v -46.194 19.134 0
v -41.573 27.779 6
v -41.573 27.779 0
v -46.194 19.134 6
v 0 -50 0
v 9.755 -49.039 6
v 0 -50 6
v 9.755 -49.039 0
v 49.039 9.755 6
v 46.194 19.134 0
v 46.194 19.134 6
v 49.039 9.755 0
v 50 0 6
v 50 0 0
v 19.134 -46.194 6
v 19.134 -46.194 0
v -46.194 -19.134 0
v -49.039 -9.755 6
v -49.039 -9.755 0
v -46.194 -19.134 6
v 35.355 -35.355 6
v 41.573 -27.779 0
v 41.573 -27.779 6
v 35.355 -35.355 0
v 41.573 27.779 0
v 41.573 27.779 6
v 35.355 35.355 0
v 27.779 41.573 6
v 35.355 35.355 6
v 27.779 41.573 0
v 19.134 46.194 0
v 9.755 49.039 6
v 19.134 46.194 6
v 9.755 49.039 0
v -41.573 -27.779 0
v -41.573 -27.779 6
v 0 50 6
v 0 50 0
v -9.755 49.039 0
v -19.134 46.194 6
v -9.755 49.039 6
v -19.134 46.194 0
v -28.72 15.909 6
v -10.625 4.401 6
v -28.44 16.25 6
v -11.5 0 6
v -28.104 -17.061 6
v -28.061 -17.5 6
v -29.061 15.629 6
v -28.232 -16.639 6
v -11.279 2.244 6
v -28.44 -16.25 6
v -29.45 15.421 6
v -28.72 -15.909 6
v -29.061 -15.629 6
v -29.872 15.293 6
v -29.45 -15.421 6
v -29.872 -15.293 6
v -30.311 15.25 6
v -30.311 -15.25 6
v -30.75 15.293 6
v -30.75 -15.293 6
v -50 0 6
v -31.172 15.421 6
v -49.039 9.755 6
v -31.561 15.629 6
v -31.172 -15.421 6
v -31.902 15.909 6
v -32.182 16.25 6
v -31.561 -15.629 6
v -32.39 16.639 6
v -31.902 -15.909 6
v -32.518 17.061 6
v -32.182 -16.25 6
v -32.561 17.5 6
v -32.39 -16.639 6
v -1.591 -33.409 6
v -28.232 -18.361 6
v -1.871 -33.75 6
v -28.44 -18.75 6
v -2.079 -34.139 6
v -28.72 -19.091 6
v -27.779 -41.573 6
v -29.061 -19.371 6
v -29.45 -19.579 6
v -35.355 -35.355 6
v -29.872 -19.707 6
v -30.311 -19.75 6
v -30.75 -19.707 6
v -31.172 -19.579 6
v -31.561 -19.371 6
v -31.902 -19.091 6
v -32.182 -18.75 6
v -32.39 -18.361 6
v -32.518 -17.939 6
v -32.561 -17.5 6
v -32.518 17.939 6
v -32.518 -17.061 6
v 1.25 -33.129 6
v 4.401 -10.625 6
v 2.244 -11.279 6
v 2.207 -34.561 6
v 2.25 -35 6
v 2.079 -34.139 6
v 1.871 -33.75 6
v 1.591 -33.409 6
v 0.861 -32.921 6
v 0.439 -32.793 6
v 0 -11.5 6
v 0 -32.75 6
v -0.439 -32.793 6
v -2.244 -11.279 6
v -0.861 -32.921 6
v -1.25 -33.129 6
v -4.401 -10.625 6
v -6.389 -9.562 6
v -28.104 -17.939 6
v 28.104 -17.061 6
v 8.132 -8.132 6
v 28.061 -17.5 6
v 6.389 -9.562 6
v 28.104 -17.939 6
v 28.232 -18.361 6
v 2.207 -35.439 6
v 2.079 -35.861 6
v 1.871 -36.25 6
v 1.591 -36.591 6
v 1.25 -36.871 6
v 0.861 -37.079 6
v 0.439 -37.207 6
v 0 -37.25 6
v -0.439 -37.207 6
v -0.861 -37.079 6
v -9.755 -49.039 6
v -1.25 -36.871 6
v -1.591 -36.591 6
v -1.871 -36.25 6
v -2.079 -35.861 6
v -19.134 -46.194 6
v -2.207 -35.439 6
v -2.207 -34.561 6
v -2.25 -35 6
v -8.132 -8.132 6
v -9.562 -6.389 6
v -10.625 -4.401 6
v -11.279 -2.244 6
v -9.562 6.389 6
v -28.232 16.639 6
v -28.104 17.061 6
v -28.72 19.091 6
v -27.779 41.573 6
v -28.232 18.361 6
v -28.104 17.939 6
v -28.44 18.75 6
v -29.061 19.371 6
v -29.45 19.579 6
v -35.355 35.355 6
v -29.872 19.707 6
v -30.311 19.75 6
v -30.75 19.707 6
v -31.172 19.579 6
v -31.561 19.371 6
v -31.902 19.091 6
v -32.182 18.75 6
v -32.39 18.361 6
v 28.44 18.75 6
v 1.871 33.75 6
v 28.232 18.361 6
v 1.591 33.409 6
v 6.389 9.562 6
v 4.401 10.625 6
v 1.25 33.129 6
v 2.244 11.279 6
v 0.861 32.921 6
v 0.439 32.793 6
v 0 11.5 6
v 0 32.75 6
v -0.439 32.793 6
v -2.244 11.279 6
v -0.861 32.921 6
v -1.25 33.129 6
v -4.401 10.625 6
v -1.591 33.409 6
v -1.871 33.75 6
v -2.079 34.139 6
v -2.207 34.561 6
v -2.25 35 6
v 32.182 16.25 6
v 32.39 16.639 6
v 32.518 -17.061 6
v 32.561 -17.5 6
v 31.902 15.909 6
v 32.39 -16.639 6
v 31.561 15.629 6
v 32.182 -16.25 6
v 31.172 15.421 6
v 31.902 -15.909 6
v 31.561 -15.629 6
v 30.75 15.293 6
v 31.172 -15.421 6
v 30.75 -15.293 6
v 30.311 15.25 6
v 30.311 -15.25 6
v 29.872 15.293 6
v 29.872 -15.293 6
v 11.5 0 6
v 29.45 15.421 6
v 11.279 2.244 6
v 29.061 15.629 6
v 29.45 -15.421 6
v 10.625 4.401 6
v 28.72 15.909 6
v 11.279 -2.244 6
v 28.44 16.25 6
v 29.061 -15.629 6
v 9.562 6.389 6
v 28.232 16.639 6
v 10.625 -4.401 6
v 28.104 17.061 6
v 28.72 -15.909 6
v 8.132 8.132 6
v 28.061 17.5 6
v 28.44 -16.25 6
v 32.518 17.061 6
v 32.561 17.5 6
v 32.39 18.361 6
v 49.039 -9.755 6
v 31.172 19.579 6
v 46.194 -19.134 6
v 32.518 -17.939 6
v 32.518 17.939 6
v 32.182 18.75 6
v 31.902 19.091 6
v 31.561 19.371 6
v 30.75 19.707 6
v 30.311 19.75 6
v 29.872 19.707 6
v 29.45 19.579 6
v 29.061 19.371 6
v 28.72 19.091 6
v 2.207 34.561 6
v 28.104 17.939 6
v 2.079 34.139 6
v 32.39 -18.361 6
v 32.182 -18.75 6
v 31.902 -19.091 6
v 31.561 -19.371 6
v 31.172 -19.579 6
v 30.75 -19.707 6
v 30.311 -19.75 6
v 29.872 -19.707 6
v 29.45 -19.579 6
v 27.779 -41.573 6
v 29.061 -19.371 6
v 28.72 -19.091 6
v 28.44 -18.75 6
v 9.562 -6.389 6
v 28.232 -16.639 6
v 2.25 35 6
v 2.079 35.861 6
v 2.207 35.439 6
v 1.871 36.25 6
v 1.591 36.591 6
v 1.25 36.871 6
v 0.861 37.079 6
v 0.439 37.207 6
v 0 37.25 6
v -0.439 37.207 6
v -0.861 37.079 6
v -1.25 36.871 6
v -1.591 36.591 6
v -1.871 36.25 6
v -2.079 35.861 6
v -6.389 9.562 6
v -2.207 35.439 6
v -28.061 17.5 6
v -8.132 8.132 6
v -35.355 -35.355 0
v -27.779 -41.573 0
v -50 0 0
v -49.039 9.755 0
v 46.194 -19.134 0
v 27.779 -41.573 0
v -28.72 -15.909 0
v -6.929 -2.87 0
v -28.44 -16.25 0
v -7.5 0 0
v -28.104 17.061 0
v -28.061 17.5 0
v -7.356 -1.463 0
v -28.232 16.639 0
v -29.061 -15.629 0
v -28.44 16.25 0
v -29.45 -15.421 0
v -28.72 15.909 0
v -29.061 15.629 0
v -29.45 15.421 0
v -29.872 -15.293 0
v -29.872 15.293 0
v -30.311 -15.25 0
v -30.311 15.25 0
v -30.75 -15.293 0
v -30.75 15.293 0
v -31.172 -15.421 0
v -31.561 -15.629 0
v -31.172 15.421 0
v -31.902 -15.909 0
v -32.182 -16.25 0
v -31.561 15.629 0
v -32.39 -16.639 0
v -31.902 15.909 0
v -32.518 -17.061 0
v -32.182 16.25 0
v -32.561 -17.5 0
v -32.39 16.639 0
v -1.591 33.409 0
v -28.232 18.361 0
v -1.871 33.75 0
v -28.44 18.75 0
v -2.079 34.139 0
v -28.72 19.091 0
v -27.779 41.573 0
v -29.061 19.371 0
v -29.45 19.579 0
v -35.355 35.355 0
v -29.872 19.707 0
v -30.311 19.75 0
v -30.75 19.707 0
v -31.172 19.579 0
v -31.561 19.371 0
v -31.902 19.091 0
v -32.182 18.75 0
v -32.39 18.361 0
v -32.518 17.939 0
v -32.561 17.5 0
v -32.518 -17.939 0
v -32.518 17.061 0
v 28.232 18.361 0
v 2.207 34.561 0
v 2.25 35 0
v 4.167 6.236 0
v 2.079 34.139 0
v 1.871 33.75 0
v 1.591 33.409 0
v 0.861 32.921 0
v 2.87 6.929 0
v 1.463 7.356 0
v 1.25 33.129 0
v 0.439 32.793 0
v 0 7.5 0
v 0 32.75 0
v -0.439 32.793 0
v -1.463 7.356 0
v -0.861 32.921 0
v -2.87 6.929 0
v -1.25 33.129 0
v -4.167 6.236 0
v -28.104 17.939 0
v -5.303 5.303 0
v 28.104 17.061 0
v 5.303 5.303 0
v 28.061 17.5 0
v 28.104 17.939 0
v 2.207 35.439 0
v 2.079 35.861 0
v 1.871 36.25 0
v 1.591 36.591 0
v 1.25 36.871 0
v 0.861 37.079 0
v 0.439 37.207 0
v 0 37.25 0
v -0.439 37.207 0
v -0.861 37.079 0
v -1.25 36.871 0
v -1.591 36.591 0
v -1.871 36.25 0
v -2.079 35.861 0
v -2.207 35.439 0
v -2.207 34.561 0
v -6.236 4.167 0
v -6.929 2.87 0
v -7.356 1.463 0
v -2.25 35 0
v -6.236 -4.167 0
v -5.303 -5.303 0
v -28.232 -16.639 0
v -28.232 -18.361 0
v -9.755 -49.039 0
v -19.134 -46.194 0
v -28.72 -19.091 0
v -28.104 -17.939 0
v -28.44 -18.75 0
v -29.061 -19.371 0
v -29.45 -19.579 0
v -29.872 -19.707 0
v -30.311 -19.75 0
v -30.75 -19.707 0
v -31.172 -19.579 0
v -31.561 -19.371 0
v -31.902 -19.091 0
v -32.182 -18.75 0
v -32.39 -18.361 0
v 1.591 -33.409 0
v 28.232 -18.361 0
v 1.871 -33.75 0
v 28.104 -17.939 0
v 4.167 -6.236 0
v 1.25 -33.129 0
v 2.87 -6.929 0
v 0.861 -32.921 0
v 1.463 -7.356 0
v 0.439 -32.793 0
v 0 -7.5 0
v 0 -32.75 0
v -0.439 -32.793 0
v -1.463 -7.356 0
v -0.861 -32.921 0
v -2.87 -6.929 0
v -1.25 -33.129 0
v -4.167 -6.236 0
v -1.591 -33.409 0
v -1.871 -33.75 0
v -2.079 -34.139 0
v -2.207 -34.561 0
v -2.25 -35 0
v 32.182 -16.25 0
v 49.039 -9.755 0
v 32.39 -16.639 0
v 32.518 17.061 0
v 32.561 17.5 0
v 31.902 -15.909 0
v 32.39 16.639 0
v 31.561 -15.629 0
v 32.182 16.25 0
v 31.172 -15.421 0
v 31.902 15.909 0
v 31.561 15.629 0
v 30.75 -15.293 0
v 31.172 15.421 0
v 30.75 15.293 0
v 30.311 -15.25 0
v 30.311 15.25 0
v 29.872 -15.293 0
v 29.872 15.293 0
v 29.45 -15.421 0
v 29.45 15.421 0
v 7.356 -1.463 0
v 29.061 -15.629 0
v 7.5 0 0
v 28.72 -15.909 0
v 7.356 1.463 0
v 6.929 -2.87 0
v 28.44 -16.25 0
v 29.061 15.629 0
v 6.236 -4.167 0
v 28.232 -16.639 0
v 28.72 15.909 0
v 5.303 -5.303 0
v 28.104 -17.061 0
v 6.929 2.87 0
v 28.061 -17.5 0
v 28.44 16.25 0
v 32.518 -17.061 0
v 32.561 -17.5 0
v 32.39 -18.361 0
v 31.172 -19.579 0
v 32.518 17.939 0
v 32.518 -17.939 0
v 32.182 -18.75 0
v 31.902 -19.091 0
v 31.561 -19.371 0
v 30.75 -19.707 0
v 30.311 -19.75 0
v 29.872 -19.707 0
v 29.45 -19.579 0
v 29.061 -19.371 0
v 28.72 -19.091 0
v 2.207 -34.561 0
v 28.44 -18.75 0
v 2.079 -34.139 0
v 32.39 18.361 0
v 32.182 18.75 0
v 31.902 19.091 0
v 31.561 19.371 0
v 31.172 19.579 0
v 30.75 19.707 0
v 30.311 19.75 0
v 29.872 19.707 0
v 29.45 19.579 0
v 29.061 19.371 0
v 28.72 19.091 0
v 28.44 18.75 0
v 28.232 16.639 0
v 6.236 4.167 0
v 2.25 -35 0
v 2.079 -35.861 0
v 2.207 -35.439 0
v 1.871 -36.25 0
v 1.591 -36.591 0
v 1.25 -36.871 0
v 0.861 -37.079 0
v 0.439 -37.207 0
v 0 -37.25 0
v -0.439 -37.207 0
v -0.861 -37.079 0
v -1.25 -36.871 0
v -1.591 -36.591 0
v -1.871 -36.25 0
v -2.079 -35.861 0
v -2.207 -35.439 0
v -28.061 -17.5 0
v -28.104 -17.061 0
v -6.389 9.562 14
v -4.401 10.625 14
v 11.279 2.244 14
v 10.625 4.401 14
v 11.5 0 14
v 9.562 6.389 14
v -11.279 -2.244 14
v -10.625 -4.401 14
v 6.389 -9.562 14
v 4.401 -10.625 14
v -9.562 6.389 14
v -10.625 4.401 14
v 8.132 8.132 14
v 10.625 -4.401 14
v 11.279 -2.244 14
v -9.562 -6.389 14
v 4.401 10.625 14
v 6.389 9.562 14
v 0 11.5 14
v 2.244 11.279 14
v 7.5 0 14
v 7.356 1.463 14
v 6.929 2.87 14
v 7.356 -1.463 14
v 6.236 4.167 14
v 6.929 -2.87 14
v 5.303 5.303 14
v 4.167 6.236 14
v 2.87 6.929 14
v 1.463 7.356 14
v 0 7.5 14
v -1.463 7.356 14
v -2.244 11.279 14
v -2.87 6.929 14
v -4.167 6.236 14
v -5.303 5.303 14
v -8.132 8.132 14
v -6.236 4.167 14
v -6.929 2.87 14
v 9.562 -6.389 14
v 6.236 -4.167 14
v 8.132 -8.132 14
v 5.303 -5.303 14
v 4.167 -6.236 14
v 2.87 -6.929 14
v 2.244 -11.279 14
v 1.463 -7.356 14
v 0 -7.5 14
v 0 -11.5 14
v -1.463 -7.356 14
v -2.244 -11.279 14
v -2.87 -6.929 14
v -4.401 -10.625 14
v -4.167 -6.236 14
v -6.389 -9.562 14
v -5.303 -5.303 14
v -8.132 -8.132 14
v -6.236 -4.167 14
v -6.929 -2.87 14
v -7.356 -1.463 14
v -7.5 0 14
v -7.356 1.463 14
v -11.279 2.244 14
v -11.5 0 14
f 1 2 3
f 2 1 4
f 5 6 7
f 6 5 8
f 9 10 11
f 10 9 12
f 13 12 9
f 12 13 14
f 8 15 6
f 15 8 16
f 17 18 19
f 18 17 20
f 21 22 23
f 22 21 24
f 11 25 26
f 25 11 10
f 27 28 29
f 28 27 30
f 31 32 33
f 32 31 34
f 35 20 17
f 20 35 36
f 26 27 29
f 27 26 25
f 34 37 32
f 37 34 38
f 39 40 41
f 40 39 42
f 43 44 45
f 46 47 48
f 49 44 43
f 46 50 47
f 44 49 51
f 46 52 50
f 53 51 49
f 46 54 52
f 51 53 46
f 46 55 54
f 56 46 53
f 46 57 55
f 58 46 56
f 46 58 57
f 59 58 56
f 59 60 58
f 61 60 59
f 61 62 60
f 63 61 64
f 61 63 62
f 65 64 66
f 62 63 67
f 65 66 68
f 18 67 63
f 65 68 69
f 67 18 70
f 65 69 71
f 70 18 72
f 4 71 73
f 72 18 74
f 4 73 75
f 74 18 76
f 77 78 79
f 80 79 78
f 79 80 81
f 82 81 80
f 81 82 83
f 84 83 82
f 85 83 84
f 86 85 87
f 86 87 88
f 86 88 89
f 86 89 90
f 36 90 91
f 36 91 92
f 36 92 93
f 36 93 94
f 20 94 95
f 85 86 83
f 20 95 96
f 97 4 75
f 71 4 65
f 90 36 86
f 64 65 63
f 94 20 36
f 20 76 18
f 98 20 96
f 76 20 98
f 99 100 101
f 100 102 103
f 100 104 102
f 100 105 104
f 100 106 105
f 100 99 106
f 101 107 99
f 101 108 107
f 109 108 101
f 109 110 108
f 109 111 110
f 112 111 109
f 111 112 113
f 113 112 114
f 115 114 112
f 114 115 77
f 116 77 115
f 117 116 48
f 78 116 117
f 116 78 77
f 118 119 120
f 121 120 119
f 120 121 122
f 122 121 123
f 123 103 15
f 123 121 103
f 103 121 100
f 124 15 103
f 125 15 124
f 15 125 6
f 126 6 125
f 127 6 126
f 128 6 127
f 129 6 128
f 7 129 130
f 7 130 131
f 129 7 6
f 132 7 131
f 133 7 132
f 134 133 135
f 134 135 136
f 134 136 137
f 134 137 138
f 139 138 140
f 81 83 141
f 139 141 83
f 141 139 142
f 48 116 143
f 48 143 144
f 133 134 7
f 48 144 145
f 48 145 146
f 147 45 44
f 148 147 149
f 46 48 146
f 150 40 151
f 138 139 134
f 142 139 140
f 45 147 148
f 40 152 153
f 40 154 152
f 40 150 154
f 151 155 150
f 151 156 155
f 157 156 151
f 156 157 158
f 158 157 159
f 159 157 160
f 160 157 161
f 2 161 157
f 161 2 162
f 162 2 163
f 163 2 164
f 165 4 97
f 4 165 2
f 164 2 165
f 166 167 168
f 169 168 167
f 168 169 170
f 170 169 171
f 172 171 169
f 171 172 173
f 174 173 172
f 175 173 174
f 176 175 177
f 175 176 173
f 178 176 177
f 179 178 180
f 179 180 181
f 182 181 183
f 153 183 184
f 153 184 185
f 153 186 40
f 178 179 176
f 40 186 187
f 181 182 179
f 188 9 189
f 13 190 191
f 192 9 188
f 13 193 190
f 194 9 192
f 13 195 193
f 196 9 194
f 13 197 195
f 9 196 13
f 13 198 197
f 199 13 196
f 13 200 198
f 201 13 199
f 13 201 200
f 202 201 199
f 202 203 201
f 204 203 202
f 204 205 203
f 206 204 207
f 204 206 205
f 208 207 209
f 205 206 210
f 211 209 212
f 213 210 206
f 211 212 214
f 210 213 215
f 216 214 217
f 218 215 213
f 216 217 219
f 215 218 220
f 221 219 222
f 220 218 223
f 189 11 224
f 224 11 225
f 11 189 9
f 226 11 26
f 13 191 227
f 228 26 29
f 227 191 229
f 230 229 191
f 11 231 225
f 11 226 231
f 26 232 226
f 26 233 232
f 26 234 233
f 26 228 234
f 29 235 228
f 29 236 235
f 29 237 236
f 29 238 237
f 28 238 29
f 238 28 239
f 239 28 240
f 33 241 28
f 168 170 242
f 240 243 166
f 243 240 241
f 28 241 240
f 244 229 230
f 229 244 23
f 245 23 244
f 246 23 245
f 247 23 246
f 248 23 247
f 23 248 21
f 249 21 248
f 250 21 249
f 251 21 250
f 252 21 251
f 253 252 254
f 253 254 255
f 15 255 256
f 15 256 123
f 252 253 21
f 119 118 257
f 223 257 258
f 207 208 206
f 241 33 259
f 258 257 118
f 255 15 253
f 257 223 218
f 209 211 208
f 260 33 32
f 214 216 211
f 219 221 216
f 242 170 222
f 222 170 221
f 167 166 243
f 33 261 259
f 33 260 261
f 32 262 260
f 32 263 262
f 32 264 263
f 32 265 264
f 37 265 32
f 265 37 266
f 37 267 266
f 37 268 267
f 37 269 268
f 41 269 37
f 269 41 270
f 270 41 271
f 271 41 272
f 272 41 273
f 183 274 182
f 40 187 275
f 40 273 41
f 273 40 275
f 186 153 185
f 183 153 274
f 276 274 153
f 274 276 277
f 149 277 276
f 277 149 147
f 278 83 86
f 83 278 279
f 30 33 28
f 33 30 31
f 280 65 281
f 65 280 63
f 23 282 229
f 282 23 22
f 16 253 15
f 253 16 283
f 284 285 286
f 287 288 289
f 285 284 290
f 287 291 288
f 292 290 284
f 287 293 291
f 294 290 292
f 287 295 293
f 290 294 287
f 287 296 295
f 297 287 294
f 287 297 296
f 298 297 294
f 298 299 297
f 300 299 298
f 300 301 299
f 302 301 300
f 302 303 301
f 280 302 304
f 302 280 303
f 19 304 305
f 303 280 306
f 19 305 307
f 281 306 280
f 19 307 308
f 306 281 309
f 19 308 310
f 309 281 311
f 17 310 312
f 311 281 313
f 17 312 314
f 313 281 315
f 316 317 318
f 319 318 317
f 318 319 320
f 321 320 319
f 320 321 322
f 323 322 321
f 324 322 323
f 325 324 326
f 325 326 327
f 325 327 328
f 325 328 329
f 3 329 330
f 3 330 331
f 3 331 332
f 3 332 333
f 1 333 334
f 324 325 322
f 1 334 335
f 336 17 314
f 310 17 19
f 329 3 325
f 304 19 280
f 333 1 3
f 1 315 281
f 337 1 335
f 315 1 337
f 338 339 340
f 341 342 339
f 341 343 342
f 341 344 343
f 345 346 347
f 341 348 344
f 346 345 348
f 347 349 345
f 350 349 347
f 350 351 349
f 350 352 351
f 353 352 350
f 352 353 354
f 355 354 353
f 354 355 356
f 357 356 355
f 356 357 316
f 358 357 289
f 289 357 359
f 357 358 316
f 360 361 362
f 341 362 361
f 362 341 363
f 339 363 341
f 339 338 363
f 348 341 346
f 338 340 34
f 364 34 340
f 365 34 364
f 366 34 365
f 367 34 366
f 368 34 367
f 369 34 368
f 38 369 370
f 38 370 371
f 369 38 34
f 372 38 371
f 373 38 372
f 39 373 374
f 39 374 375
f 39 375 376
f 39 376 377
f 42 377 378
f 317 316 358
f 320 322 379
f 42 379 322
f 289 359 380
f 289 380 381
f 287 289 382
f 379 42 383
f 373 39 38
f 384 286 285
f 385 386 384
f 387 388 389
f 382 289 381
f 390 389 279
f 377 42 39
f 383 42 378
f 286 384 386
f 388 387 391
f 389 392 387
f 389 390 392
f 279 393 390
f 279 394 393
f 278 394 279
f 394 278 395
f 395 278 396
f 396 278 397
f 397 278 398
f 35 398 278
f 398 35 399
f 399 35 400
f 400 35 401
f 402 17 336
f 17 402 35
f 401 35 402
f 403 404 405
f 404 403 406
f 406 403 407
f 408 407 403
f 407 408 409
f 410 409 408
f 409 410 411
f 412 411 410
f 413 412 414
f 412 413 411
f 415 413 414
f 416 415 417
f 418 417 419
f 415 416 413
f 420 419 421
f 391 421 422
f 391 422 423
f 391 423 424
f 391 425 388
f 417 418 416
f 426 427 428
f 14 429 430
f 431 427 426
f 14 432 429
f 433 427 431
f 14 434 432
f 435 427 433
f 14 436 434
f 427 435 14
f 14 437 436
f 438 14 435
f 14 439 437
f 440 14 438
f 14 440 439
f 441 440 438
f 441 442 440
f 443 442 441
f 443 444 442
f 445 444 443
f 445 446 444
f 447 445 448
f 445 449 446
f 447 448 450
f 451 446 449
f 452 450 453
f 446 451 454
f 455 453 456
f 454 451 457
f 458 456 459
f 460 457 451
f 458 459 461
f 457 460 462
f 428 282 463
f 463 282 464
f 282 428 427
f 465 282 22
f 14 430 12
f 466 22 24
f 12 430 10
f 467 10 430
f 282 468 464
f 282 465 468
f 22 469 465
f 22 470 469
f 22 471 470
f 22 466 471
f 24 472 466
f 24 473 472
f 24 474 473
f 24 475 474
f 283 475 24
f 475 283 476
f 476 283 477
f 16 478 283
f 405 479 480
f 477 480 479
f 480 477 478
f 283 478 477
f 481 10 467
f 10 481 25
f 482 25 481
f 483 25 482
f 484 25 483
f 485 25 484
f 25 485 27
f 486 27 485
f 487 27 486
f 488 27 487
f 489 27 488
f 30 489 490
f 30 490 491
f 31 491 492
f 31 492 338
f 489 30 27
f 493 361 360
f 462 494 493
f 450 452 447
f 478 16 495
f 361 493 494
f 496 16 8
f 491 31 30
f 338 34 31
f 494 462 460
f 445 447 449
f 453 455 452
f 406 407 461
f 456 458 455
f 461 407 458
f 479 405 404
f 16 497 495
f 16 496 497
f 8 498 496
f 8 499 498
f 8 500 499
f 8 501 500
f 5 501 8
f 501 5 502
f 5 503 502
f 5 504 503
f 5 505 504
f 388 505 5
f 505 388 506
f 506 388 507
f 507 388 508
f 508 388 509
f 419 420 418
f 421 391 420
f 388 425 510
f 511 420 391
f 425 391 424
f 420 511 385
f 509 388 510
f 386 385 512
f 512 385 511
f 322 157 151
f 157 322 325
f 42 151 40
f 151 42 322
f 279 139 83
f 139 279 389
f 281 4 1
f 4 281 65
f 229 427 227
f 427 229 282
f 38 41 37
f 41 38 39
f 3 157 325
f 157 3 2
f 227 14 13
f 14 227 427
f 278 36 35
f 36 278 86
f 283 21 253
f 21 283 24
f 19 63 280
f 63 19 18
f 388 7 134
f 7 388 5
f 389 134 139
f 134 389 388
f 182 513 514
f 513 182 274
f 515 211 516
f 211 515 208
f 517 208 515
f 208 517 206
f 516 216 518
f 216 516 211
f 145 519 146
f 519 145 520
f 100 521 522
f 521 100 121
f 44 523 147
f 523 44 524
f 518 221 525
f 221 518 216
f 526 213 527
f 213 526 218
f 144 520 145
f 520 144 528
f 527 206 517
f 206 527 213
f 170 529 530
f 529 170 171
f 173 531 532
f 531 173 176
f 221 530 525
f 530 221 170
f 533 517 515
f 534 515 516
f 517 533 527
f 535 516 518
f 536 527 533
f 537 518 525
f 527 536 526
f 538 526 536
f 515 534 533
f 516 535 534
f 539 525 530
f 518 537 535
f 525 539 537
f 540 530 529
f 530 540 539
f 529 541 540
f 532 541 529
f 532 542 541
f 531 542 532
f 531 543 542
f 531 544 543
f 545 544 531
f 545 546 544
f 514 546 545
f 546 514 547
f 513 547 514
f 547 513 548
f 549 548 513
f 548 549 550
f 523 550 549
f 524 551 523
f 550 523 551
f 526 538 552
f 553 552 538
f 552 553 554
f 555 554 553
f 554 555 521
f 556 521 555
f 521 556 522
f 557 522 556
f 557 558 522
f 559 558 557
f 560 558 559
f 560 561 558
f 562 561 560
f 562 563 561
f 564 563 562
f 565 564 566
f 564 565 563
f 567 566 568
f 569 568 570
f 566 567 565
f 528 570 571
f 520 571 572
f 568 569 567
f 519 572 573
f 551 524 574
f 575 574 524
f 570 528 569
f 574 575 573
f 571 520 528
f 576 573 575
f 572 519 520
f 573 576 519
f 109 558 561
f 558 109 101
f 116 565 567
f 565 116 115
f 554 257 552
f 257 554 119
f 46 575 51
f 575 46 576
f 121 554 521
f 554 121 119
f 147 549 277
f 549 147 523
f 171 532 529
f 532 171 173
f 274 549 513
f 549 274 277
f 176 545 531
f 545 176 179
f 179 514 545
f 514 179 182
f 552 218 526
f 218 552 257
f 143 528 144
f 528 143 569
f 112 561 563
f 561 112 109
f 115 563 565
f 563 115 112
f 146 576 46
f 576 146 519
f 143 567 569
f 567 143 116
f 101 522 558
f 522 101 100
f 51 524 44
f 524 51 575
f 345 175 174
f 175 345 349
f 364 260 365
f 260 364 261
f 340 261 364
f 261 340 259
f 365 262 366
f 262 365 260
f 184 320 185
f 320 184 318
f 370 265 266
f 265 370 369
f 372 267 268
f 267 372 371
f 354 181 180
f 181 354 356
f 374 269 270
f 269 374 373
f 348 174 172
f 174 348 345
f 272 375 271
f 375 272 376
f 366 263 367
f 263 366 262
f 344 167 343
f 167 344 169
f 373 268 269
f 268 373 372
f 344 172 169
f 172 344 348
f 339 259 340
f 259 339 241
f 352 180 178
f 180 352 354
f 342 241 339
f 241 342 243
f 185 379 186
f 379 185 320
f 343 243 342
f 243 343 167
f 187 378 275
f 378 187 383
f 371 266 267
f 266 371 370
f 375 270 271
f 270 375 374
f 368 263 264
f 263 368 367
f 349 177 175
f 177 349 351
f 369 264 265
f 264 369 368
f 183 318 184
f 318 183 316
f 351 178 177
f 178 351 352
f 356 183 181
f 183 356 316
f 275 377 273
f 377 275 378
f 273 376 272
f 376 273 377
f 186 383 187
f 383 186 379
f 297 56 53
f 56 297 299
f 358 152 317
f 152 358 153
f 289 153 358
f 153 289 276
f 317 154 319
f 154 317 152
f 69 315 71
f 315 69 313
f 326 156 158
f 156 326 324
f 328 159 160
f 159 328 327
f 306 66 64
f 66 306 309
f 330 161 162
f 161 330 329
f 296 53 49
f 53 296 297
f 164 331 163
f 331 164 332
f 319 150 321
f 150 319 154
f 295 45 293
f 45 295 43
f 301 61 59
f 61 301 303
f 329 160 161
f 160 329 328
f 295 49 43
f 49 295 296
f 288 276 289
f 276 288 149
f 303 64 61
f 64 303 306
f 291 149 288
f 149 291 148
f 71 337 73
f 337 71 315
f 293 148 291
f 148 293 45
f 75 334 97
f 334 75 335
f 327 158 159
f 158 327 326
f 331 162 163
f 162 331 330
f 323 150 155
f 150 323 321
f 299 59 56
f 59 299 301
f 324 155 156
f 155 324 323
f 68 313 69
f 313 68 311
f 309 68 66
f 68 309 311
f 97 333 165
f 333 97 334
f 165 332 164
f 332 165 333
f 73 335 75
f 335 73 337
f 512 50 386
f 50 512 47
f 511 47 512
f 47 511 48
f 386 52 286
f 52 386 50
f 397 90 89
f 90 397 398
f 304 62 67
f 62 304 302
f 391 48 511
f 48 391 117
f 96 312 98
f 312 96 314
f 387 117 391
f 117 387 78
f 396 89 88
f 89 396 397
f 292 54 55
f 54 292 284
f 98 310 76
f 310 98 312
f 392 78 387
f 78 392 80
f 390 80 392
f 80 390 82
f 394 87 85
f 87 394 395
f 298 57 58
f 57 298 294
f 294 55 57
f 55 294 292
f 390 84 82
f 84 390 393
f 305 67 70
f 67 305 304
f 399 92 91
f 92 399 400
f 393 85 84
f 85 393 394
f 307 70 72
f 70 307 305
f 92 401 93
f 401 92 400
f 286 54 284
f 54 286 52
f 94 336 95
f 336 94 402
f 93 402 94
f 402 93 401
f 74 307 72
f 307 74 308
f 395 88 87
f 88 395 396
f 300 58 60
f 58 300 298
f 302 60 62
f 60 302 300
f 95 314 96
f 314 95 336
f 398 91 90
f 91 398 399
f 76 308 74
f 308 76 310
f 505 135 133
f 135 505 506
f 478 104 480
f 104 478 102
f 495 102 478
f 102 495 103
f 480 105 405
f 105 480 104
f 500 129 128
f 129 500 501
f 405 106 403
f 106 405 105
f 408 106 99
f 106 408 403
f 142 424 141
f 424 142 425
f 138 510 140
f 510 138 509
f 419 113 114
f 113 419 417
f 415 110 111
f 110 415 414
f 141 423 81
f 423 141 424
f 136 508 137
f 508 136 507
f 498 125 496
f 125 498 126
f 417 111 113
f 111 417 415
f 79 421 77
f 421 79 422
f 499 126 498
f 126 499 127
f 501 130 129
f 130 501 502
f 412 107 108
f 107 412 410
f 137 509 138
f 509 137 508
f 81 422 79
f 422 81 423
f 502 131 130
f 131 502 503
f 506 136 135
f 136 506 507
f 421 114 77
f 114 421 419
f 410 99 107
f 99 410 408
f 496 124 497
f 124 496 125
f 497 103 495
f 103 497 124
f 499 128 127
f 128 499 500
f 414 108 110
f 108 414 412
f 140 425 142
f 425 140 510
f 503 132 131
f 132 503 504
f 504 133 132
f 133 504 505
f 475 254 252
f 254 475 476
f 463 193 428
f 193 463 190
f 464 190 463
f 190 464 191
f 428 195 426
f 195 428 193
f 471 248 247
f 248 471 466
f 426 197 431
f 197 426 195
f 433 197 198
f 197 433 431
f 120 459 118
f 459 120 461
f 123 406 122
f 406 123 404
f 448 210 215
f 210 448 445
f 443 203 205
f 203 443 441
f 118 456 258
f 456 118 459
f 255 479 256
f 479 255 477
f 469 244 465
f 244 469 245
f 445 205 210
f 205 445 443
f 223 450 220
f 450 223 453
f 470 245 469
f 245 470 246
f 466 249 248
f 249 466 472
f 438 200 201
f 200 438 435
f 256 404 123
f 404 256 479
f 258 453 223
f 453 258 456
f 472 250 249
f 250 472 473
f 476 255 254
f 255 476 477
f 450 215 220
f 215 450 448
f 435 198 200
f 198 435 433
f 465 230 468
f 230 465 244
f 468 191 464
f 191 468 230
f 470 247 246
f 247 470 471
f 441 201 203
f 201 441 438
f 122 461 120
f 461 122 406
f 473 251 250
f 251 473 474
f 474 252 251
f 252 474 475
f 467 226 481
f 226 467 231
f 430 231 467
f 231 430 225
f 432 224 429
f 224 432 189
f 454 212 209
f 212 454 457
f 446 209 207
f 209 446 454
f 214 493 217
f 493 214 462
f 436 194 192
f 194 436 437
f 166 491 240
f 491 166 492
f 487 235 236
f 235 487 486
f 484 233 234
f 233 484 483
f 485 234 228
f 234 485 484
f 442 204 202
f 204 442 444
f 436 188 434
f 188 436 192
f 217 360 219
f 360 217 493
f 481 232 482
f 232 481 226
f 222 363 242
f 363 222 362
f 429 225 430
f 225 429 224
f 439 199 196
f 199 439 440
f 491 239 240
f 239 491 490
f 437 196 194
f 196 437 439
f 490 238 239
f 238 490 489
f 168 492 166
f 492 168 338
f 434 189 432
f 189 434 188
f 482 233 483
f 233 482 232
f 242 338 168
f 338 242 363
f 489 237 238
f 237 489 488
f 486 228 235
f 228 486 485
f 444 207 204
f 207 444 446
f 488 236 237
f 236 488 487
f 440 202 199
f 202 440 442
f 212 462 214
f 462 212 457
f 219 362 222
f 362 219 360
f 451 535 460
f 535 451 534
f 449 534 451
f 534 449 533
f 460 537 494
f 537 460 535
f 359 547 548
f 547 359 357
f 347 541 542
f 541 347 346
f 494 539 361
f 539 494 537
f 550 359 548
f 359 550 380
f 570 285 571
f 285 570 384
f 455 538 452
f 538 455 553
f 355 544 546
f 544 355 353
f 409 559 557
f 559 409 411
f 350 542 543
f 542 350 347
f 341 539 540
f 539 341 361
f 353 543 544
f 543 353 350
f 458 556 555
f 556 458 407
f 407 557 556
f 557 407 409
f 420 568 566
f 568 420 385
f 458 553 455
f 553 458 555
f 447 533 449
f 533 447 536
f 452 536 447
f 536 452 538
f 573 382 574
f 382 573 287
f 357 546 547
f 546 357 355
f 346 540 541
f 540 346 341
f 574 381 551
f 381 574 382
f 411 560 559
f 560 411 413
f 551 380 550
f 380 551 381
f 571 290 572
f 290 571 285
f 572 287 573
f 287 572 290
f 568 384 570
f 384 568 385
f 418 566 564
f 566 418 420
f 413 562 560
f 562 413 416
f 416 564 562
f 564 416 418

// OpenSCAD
$fn = 32;

// ----------------------------------------------------------------------
// Flange Ø100 x 6
// 6 holes on a Ø70 bolt circle, bolted joints
// ----------------------------------------------------------------------

// --- parameters (mm) ---
flange_d = 100;  // outside diameter of the flange
thickness = 6;   // flange thickness
holes = 6;       // number of bolt holes
pcd = 70;        // bolt circle diameter
start_deg = 90;  // angle of the first hole, from +X
hole_d = 4.5;    // bolt hole diameter
bore_d = 15;     // central through bore
hub_d = 23;      // hub outside diameter
hub_h = 8;       // hub height above the flange face (0 = no hub)

// --- derived feature positions (mm) ---
height = thickness + hub_h;  // = 14   overall height of the part
pcd_r = pcd / 2;             // = 35   bolt circle radius
hole_step = 360 / holes;     // = 60   angular pitch
feature_centers = [
  [pcd_r * cos(start_deg + 0 * hole_step), pcd_r * sin(start_deg + 0 * hole_step)],
  [pcd_r * cos(start_deg + 1 * hole_step), pcd_r * sin(start_deg + 1 * hole_step)],
  [pcd_r * cos(start_deg + 2 * hole_step), pcd_r * sin(start_deg + 2 * hole_step)],
  [pcd_r * cos(start_deg + 3 * hole_step), pcd_r * sin(start_deg + 3 * hole_step)],
  [pcd_r * cos(start_deg + 4 * hole_step), pcd_r * sin(start_deg + 4 * hole_step)],
  [pcd_r * cos(start_deg + 5 * hole_step), pcd_r * sin(start_deg + 5 * hole_step)]
];   // bolt hole centres on the pitch circle

// flange disc, every hole and the bore cut straight through
difference() {
  union() {
    cylinder(d = flange_d, h = thickness);
    cylinder(d = hub_d, h = height);  // hub, overlapped into the flange
  }
  translate([0, 0, -1]) cylinder(d = bore_d, h = height + 2);  // bore, through
  for (centre = feature_centers)
    translate([centre[0], centre[1], -1]) cylinder(d = hole_d, h = thickness + 2);
}
